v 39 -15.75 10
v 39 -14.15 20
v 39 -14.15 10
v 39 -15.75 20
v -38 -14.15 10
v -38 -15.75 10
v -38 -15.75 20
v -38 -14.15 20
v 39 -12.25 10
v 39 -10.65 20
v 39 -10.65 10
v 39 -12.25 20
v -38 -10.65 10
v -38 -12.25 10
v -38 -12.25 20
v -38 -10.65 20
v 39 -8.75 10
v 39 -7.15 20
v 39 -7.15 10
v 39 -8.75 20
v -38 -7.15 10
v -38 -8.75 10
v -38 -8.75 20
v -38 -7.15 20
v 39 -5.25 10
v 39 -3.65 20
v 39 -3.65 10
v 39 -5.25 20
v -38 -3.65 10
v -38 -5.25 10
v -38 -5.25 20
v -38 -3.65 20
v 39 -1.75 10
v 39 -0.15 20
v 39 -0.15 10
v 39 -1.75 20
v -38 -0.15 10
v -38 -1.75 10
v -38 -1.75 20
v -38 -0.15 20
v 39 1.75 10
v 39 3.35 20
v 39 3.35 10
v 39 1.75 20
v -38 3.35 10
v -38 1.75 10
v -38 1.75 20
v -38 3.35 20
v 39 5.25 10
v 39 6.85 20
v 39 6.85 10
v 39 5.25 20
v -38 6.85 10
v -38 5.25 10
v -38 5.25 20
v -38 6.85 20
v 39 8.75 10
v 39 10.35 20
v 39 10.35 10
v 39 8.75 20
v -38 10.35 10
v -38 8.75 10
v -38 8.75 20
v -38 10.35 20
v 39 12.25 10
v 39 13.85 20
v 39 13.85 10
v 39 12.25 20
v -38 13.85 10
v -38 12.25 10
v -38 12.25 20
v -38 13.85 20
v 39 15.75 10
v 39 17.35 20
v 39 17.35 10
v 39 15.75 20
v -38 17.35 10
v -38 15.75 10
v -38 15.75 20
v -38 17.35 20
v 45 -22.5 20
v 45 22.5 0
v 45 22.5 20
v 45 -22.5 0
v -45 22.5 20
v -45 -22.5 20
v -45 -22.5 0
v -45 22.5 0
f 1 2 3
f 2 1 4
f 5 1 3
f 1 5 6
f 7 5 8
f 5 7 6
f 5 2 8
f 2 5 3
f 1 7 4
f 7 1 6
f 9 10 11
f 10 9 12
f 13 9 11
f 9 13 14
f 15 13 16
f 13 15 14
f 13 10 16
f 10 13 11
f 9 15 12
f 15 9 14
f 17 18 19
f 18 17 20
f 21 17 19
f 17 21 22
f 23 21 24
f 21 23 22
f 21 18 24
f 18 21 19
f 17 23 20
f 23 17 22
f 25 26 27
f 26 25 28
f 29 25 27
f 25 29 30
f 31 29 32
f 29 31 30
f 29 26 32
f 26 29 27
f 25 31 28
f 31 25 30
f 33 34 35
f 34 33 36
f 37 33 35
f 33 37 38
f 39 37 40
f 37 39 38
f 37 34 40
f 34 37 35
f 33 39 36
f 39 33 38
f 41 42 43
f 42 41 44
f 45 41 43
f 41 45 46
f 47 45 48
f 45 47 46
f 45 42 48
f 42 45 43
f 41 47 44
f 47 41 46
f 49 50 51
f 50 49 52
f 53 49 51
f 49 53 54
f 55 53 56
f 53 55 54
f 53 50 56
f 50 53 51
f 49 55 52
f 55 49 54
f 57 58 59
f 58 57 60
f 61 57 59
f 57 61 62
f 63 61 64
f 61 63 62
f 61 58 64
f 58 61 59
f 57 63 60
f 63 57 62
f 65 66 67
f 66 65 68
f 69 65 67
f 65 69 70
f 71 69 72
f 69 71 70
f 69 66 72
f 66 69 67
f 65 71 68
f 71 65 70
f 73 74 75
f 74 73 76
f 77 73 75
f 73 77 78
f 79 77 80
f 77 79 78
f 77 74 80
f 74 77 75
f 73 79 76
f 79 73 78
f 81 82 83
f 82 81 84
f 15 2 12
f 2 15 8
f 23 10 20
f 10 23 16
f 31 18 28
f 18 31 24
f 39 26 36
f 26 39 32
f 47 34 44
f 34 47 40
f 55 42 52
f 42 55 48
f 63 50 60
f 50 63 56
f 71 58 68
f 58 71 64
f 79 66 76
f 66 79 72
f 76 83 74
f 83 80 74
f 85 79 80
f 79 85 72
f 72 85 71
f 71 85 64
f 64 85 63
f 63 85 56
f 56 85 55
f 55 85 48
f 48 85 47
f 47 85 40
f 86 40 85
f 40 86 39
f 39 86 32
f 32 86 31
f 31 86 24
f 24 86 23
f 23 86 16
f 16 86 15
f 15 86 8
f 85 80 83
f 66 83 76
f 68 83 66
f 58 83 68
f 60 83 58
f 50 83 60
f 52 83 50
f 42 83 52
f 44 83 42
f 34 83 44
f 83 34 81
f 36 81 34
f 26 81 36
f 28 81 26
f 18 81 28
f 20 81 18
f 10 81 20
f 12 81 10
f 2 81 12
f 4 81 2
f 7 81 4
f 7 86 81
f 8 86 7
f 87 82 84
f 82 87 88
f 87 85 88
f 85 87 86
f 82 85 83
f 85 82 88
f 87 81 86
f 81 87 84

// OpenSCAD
// Microscope slide drying rack
// Print orientation: base block on the bed (z = 0), slots open upward (+Z)

// ---------------- Parameters ----------------
block_len    = 90;    // base block length along X (mm)
block_wid    = 45;    // base block width along Y (mm)
block_h      = 20;    // base block height along Z (mm)

slot_count   = 10;    // number of slide slots
slot_len     = 77;    // slot length along X (mm)
slot_w       = 1.6;   // slot width along Y (mm)
slot_depth   = 10;    // slot depth from top face (mm)
slot_pitch   = 3.5;   // centre-to-centre slot spacing along Y (mm)

eps          = 0.5;   // overshoot of cutters past faces (mm)

$fn = 64;

// ---------------- Derived ----------------
first_y = -(slot_count - 1) * slot_pitch / 2;   // Y of first slot (group centred)

// ---------------- Model ----------------
difference() {
    // Base block, centred in X and Y, resting on z = 0
    translate([-block_len / 2, -block_wid / 2, 0])
        cube([block_len, block_wid, block_h]);

    // Parallel slots running along X, open at the top
    for (i = [0 : slot_count - 1])
        translate([-(slot_len / 2) + eps, first_y + i * slot_pitch, block_h - slot_depth])
            cube([slot_len, slot_w, slot_depth + eps]);
}
